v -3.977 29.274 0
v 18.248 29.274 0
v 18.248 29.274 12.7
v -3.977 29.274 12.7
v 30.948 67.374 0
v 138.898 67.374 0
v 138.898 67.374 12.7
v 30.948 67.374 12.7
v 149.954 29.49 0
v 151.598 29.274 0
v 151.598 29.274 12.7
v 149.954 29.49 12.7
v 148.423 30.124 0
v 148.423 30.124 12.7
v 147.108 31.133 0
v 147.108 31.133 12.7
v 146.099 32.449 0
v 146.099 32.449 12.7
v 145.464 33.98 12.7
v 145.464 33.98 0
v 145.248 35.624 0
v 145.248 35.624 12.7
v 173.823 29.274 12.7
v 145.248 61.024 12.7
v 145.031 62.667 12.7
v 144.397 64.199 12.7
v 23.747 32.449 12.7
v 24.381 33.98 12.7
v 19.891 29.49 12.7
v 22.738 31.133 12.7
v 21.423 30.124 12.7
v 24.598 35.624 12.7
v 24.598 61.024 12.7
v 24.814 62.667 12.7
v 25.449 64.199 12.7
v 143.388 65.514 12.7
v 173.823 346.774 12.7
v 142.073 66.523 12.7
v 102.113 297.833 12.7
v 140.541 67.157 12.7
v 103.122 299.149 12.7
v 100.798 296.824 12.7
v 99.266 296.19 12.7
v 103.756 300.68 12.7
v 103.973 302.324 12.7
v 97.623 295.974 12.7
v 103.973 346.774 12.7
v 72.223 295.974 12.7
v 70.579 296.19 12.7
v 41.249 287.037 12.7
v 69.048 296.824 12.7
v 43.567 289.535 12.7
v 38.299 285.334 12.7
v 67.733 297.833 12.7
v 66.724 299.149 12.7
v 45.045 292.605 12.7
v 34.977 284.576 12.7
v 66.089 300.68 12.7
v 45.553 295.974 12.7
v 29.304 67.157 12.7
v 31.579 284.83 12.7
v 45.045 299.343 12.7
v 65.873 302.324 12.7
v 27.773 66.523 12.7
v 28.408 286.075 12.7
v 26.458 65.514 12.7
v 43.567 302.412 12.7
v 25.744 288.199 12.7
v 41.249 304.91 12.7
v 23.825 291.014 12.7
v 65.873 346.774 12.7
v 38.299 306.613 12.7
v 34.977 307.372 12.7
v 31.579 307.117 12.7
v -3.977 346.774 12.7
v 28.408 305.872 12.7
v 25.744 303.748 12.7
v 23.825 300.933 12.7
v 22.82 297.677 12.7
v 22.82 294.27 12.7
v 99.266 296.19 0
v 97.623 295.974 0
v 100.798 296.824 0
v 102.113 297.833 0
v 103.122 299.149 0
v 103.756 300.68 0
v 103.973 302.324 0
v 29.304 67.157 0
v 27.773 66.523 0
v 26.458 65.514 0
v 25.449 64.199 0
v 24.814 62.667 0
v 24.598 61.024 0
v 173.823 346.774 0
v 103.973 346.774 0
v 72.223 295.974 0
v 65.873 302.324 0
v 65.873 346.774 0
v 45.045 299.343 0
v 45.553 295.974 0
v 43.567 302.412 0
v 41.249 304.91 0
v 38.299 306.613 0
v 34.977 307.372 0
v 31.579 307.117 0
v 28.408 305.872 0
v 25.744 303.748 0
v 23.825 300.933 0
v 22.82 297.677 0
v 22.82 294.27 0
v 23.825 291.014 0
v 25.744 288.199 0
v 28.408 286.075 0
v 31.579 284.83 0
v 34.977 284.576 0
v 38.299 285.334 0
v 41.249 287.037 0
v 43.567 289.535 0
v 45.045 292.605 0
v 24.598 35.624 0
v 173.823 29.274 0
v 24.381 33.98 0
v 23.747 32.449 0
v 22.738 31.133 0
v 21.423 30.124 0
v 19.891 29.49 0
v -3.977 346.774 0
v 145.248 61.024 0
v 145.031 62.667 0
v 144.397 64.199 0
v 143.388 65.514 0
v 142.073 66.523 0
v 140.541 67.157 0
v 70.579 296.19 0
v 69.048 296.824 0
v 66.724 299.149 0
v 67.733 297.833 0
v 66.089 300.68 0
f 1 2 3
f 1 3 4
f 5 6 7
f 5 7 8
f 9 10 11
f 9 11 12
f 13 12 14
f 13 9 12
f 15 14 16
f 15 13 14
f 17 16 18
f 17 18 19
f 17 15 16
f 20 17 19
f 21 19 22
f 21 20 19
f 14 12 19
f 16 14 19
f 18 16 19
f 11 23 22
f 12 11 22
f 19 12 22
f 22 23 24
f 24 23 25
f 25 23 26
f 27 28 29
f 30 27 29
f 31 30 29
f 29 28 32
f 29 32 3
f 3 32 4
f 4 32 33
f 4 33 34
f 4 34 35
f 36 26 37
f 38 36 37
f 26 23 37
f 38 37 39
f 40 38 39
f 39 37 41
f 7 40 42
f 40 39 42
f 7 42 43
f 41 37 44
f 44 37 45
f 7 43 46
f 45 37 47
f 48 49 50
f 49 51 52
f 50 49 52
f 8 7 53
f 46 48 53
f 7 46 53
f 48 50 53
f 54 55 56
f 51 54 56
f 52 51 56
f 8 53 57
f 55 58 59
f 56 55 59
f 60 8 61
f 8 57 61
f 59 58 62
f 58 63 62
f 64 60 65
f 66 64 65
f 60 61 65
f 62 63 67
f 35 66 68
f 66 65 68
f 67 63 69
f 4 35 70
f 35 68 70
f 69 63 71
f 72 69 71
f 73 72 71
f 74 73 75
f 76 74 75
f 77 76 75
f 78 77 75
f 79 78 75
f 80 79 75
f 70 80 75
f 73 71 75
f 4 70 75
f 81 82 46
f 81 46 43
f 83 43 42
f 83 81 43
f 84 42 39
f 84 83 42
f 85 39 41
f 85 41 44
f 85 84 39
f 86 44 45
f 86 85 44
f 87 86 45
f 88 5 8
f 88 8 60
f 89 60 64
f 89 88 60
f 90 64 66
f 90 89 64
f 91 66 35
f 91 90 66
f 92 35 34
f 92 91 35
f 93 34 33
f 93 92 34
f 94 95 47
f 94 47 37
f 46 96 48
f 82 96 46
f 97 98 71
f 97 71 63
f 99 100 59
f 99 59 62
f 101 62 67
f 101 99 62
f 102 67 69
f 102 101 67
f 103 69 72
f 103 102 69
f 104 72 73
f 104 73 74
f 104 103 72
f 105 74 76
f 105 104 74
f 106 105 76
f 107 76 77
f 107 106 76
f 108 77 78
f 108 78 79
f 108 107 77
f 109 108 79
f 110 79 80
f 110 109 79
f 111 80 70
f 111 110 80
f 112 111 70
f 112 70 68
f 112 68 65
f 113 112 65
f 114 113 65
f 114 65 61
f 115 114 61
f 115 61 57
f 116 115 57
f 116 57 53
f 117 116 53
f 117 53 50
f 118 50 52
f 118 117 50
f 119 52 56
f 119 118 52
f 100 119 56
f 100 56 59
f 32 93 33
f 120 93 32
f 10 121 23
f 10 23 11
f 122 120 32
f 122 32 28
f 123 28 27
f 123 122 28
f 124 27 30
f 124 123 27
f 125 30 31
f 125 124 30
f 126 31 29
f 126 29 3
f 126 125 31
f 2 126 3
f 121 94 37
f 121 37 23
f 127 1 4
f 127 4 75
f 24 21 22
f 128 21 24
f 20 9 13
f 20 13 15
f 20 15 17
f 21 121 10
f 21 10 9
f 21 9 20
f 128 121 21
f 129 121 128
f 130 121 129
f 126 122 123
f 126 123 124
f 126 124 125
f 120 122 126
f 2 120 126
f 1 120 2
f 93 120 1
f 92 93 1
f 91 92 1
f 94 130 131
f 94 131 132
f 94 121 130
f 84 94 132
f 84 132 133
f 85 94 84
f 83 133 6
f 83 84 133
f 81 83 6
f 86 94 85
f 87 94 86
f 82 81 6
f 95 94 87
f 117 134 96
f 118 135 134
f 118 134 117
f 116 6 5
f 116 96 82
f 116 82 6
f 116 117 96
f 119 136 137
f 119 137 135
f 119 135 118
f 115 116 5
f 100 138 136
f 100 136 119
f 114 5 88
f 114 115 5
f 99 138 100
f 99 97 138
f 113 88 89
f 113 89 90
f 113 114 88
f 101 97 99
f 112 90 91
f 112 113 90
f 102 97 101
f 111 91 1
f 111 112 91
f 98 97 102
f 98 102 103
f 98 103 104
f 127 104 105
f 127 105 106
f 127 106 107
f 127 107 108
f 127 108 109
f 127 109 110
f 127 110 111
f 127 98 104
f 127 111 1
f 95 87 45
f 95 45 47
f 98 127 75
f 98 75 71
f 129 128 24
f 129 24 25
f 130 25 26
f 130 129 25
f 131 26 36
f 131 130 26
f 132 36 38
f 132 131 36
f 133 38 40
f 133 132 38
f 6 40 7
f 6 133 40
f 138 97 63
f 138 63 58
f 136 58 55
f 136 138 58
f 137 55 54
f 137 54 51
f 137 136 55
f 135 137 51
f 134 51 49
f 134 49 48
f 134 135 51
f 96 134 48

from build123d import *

# Parameters (mm, degrees)
SKETCH1_R           = 11.43
BOSS_EXTRUDE2_DEPTH = 12.7


with BuildPart() as part:
    # Sketch1 → Boss-Extrude2 (new body)
    with BuildSketch(Plane.XY):
        with BuildLine():
            Line((103.972822377, 346.773604775), (173.822822377, 346.773604775))
            Line((173.822822377, 346.773604775), (173.822822377, 35.623604775))
            Line((173.822822377, 35.623604775), (173.822822377, 29.273604775))
            Line((173.822822377, 29.273604775), (161.122822377, 29.273604775))
            Line((161.122822377, 29.273604775), (151.597822377, 29.273604775))
            ThreePointArc((151.597822377, 29.273604775), (147.107694316, 31.133476714), (145.247822377, 35.623604775))
            Line((145.247822377, 35.623604775), (145.247822377, 61.023604775))
            ThreePointArc((145.247822377, 61.023604775), (143.387950437, 65.513732836), (138.897822377, 67.373604775))
            Line((138.897822377, 67.373604775), (30.947822377, 67.373604775))
            ThreePointArc((30.947822377, 67.373604775), (26.457694316, 65.513732836), (24.597822377, 61.023604775))
            Line((24.597822377, 61.023604775), (24.597822377, 35.623604775))
            ThreePointArc((24.597822377, 35.623604775), (22.737950437, 31.133476714), (18.247822377, 29.273604775))
            Line((18.247822377, 29.273604775), (2.372822377, 29.273604775))
            Line((2.372822377, 29.273604775), (-3.977177623, 29.273604775))
            Line((-3.977177623, 29.273604775), (-3.977177623, 35.623604775))
            Line((-3.977177623, 35.623604775), (-3.977177623, 346.773604775))
            Line((-3.977177623, 346.773604775), (65.872822377, 346.773604775))
            Line((65.872822377, 346.773604775), (65.872822377, 302.323604775))
            ThreePointArc((65.872822377, 302.323604775), (67.732694316, 297.833476714), (72.222822377, 295.973604775))
            Line((72.222822377, 295.973604775), (97.622822377, 295.973604775))
            ThreePointArc((97.622822377, 295.973604775), (102.112950437, 297.833476714), (103.972822377, 302.323604775))
            Line((103.972822377, 302.323604775), (103.972822377, 346.773604775))
        make_face()
        with Locations((34.122822377, 295.973604775)):
            Circle(SKETCH1_R, mode=Mode.SUBTRACT)
    extrude(amount=BOSS_EXTRUDE2_DEPTH)


solid = part.part
